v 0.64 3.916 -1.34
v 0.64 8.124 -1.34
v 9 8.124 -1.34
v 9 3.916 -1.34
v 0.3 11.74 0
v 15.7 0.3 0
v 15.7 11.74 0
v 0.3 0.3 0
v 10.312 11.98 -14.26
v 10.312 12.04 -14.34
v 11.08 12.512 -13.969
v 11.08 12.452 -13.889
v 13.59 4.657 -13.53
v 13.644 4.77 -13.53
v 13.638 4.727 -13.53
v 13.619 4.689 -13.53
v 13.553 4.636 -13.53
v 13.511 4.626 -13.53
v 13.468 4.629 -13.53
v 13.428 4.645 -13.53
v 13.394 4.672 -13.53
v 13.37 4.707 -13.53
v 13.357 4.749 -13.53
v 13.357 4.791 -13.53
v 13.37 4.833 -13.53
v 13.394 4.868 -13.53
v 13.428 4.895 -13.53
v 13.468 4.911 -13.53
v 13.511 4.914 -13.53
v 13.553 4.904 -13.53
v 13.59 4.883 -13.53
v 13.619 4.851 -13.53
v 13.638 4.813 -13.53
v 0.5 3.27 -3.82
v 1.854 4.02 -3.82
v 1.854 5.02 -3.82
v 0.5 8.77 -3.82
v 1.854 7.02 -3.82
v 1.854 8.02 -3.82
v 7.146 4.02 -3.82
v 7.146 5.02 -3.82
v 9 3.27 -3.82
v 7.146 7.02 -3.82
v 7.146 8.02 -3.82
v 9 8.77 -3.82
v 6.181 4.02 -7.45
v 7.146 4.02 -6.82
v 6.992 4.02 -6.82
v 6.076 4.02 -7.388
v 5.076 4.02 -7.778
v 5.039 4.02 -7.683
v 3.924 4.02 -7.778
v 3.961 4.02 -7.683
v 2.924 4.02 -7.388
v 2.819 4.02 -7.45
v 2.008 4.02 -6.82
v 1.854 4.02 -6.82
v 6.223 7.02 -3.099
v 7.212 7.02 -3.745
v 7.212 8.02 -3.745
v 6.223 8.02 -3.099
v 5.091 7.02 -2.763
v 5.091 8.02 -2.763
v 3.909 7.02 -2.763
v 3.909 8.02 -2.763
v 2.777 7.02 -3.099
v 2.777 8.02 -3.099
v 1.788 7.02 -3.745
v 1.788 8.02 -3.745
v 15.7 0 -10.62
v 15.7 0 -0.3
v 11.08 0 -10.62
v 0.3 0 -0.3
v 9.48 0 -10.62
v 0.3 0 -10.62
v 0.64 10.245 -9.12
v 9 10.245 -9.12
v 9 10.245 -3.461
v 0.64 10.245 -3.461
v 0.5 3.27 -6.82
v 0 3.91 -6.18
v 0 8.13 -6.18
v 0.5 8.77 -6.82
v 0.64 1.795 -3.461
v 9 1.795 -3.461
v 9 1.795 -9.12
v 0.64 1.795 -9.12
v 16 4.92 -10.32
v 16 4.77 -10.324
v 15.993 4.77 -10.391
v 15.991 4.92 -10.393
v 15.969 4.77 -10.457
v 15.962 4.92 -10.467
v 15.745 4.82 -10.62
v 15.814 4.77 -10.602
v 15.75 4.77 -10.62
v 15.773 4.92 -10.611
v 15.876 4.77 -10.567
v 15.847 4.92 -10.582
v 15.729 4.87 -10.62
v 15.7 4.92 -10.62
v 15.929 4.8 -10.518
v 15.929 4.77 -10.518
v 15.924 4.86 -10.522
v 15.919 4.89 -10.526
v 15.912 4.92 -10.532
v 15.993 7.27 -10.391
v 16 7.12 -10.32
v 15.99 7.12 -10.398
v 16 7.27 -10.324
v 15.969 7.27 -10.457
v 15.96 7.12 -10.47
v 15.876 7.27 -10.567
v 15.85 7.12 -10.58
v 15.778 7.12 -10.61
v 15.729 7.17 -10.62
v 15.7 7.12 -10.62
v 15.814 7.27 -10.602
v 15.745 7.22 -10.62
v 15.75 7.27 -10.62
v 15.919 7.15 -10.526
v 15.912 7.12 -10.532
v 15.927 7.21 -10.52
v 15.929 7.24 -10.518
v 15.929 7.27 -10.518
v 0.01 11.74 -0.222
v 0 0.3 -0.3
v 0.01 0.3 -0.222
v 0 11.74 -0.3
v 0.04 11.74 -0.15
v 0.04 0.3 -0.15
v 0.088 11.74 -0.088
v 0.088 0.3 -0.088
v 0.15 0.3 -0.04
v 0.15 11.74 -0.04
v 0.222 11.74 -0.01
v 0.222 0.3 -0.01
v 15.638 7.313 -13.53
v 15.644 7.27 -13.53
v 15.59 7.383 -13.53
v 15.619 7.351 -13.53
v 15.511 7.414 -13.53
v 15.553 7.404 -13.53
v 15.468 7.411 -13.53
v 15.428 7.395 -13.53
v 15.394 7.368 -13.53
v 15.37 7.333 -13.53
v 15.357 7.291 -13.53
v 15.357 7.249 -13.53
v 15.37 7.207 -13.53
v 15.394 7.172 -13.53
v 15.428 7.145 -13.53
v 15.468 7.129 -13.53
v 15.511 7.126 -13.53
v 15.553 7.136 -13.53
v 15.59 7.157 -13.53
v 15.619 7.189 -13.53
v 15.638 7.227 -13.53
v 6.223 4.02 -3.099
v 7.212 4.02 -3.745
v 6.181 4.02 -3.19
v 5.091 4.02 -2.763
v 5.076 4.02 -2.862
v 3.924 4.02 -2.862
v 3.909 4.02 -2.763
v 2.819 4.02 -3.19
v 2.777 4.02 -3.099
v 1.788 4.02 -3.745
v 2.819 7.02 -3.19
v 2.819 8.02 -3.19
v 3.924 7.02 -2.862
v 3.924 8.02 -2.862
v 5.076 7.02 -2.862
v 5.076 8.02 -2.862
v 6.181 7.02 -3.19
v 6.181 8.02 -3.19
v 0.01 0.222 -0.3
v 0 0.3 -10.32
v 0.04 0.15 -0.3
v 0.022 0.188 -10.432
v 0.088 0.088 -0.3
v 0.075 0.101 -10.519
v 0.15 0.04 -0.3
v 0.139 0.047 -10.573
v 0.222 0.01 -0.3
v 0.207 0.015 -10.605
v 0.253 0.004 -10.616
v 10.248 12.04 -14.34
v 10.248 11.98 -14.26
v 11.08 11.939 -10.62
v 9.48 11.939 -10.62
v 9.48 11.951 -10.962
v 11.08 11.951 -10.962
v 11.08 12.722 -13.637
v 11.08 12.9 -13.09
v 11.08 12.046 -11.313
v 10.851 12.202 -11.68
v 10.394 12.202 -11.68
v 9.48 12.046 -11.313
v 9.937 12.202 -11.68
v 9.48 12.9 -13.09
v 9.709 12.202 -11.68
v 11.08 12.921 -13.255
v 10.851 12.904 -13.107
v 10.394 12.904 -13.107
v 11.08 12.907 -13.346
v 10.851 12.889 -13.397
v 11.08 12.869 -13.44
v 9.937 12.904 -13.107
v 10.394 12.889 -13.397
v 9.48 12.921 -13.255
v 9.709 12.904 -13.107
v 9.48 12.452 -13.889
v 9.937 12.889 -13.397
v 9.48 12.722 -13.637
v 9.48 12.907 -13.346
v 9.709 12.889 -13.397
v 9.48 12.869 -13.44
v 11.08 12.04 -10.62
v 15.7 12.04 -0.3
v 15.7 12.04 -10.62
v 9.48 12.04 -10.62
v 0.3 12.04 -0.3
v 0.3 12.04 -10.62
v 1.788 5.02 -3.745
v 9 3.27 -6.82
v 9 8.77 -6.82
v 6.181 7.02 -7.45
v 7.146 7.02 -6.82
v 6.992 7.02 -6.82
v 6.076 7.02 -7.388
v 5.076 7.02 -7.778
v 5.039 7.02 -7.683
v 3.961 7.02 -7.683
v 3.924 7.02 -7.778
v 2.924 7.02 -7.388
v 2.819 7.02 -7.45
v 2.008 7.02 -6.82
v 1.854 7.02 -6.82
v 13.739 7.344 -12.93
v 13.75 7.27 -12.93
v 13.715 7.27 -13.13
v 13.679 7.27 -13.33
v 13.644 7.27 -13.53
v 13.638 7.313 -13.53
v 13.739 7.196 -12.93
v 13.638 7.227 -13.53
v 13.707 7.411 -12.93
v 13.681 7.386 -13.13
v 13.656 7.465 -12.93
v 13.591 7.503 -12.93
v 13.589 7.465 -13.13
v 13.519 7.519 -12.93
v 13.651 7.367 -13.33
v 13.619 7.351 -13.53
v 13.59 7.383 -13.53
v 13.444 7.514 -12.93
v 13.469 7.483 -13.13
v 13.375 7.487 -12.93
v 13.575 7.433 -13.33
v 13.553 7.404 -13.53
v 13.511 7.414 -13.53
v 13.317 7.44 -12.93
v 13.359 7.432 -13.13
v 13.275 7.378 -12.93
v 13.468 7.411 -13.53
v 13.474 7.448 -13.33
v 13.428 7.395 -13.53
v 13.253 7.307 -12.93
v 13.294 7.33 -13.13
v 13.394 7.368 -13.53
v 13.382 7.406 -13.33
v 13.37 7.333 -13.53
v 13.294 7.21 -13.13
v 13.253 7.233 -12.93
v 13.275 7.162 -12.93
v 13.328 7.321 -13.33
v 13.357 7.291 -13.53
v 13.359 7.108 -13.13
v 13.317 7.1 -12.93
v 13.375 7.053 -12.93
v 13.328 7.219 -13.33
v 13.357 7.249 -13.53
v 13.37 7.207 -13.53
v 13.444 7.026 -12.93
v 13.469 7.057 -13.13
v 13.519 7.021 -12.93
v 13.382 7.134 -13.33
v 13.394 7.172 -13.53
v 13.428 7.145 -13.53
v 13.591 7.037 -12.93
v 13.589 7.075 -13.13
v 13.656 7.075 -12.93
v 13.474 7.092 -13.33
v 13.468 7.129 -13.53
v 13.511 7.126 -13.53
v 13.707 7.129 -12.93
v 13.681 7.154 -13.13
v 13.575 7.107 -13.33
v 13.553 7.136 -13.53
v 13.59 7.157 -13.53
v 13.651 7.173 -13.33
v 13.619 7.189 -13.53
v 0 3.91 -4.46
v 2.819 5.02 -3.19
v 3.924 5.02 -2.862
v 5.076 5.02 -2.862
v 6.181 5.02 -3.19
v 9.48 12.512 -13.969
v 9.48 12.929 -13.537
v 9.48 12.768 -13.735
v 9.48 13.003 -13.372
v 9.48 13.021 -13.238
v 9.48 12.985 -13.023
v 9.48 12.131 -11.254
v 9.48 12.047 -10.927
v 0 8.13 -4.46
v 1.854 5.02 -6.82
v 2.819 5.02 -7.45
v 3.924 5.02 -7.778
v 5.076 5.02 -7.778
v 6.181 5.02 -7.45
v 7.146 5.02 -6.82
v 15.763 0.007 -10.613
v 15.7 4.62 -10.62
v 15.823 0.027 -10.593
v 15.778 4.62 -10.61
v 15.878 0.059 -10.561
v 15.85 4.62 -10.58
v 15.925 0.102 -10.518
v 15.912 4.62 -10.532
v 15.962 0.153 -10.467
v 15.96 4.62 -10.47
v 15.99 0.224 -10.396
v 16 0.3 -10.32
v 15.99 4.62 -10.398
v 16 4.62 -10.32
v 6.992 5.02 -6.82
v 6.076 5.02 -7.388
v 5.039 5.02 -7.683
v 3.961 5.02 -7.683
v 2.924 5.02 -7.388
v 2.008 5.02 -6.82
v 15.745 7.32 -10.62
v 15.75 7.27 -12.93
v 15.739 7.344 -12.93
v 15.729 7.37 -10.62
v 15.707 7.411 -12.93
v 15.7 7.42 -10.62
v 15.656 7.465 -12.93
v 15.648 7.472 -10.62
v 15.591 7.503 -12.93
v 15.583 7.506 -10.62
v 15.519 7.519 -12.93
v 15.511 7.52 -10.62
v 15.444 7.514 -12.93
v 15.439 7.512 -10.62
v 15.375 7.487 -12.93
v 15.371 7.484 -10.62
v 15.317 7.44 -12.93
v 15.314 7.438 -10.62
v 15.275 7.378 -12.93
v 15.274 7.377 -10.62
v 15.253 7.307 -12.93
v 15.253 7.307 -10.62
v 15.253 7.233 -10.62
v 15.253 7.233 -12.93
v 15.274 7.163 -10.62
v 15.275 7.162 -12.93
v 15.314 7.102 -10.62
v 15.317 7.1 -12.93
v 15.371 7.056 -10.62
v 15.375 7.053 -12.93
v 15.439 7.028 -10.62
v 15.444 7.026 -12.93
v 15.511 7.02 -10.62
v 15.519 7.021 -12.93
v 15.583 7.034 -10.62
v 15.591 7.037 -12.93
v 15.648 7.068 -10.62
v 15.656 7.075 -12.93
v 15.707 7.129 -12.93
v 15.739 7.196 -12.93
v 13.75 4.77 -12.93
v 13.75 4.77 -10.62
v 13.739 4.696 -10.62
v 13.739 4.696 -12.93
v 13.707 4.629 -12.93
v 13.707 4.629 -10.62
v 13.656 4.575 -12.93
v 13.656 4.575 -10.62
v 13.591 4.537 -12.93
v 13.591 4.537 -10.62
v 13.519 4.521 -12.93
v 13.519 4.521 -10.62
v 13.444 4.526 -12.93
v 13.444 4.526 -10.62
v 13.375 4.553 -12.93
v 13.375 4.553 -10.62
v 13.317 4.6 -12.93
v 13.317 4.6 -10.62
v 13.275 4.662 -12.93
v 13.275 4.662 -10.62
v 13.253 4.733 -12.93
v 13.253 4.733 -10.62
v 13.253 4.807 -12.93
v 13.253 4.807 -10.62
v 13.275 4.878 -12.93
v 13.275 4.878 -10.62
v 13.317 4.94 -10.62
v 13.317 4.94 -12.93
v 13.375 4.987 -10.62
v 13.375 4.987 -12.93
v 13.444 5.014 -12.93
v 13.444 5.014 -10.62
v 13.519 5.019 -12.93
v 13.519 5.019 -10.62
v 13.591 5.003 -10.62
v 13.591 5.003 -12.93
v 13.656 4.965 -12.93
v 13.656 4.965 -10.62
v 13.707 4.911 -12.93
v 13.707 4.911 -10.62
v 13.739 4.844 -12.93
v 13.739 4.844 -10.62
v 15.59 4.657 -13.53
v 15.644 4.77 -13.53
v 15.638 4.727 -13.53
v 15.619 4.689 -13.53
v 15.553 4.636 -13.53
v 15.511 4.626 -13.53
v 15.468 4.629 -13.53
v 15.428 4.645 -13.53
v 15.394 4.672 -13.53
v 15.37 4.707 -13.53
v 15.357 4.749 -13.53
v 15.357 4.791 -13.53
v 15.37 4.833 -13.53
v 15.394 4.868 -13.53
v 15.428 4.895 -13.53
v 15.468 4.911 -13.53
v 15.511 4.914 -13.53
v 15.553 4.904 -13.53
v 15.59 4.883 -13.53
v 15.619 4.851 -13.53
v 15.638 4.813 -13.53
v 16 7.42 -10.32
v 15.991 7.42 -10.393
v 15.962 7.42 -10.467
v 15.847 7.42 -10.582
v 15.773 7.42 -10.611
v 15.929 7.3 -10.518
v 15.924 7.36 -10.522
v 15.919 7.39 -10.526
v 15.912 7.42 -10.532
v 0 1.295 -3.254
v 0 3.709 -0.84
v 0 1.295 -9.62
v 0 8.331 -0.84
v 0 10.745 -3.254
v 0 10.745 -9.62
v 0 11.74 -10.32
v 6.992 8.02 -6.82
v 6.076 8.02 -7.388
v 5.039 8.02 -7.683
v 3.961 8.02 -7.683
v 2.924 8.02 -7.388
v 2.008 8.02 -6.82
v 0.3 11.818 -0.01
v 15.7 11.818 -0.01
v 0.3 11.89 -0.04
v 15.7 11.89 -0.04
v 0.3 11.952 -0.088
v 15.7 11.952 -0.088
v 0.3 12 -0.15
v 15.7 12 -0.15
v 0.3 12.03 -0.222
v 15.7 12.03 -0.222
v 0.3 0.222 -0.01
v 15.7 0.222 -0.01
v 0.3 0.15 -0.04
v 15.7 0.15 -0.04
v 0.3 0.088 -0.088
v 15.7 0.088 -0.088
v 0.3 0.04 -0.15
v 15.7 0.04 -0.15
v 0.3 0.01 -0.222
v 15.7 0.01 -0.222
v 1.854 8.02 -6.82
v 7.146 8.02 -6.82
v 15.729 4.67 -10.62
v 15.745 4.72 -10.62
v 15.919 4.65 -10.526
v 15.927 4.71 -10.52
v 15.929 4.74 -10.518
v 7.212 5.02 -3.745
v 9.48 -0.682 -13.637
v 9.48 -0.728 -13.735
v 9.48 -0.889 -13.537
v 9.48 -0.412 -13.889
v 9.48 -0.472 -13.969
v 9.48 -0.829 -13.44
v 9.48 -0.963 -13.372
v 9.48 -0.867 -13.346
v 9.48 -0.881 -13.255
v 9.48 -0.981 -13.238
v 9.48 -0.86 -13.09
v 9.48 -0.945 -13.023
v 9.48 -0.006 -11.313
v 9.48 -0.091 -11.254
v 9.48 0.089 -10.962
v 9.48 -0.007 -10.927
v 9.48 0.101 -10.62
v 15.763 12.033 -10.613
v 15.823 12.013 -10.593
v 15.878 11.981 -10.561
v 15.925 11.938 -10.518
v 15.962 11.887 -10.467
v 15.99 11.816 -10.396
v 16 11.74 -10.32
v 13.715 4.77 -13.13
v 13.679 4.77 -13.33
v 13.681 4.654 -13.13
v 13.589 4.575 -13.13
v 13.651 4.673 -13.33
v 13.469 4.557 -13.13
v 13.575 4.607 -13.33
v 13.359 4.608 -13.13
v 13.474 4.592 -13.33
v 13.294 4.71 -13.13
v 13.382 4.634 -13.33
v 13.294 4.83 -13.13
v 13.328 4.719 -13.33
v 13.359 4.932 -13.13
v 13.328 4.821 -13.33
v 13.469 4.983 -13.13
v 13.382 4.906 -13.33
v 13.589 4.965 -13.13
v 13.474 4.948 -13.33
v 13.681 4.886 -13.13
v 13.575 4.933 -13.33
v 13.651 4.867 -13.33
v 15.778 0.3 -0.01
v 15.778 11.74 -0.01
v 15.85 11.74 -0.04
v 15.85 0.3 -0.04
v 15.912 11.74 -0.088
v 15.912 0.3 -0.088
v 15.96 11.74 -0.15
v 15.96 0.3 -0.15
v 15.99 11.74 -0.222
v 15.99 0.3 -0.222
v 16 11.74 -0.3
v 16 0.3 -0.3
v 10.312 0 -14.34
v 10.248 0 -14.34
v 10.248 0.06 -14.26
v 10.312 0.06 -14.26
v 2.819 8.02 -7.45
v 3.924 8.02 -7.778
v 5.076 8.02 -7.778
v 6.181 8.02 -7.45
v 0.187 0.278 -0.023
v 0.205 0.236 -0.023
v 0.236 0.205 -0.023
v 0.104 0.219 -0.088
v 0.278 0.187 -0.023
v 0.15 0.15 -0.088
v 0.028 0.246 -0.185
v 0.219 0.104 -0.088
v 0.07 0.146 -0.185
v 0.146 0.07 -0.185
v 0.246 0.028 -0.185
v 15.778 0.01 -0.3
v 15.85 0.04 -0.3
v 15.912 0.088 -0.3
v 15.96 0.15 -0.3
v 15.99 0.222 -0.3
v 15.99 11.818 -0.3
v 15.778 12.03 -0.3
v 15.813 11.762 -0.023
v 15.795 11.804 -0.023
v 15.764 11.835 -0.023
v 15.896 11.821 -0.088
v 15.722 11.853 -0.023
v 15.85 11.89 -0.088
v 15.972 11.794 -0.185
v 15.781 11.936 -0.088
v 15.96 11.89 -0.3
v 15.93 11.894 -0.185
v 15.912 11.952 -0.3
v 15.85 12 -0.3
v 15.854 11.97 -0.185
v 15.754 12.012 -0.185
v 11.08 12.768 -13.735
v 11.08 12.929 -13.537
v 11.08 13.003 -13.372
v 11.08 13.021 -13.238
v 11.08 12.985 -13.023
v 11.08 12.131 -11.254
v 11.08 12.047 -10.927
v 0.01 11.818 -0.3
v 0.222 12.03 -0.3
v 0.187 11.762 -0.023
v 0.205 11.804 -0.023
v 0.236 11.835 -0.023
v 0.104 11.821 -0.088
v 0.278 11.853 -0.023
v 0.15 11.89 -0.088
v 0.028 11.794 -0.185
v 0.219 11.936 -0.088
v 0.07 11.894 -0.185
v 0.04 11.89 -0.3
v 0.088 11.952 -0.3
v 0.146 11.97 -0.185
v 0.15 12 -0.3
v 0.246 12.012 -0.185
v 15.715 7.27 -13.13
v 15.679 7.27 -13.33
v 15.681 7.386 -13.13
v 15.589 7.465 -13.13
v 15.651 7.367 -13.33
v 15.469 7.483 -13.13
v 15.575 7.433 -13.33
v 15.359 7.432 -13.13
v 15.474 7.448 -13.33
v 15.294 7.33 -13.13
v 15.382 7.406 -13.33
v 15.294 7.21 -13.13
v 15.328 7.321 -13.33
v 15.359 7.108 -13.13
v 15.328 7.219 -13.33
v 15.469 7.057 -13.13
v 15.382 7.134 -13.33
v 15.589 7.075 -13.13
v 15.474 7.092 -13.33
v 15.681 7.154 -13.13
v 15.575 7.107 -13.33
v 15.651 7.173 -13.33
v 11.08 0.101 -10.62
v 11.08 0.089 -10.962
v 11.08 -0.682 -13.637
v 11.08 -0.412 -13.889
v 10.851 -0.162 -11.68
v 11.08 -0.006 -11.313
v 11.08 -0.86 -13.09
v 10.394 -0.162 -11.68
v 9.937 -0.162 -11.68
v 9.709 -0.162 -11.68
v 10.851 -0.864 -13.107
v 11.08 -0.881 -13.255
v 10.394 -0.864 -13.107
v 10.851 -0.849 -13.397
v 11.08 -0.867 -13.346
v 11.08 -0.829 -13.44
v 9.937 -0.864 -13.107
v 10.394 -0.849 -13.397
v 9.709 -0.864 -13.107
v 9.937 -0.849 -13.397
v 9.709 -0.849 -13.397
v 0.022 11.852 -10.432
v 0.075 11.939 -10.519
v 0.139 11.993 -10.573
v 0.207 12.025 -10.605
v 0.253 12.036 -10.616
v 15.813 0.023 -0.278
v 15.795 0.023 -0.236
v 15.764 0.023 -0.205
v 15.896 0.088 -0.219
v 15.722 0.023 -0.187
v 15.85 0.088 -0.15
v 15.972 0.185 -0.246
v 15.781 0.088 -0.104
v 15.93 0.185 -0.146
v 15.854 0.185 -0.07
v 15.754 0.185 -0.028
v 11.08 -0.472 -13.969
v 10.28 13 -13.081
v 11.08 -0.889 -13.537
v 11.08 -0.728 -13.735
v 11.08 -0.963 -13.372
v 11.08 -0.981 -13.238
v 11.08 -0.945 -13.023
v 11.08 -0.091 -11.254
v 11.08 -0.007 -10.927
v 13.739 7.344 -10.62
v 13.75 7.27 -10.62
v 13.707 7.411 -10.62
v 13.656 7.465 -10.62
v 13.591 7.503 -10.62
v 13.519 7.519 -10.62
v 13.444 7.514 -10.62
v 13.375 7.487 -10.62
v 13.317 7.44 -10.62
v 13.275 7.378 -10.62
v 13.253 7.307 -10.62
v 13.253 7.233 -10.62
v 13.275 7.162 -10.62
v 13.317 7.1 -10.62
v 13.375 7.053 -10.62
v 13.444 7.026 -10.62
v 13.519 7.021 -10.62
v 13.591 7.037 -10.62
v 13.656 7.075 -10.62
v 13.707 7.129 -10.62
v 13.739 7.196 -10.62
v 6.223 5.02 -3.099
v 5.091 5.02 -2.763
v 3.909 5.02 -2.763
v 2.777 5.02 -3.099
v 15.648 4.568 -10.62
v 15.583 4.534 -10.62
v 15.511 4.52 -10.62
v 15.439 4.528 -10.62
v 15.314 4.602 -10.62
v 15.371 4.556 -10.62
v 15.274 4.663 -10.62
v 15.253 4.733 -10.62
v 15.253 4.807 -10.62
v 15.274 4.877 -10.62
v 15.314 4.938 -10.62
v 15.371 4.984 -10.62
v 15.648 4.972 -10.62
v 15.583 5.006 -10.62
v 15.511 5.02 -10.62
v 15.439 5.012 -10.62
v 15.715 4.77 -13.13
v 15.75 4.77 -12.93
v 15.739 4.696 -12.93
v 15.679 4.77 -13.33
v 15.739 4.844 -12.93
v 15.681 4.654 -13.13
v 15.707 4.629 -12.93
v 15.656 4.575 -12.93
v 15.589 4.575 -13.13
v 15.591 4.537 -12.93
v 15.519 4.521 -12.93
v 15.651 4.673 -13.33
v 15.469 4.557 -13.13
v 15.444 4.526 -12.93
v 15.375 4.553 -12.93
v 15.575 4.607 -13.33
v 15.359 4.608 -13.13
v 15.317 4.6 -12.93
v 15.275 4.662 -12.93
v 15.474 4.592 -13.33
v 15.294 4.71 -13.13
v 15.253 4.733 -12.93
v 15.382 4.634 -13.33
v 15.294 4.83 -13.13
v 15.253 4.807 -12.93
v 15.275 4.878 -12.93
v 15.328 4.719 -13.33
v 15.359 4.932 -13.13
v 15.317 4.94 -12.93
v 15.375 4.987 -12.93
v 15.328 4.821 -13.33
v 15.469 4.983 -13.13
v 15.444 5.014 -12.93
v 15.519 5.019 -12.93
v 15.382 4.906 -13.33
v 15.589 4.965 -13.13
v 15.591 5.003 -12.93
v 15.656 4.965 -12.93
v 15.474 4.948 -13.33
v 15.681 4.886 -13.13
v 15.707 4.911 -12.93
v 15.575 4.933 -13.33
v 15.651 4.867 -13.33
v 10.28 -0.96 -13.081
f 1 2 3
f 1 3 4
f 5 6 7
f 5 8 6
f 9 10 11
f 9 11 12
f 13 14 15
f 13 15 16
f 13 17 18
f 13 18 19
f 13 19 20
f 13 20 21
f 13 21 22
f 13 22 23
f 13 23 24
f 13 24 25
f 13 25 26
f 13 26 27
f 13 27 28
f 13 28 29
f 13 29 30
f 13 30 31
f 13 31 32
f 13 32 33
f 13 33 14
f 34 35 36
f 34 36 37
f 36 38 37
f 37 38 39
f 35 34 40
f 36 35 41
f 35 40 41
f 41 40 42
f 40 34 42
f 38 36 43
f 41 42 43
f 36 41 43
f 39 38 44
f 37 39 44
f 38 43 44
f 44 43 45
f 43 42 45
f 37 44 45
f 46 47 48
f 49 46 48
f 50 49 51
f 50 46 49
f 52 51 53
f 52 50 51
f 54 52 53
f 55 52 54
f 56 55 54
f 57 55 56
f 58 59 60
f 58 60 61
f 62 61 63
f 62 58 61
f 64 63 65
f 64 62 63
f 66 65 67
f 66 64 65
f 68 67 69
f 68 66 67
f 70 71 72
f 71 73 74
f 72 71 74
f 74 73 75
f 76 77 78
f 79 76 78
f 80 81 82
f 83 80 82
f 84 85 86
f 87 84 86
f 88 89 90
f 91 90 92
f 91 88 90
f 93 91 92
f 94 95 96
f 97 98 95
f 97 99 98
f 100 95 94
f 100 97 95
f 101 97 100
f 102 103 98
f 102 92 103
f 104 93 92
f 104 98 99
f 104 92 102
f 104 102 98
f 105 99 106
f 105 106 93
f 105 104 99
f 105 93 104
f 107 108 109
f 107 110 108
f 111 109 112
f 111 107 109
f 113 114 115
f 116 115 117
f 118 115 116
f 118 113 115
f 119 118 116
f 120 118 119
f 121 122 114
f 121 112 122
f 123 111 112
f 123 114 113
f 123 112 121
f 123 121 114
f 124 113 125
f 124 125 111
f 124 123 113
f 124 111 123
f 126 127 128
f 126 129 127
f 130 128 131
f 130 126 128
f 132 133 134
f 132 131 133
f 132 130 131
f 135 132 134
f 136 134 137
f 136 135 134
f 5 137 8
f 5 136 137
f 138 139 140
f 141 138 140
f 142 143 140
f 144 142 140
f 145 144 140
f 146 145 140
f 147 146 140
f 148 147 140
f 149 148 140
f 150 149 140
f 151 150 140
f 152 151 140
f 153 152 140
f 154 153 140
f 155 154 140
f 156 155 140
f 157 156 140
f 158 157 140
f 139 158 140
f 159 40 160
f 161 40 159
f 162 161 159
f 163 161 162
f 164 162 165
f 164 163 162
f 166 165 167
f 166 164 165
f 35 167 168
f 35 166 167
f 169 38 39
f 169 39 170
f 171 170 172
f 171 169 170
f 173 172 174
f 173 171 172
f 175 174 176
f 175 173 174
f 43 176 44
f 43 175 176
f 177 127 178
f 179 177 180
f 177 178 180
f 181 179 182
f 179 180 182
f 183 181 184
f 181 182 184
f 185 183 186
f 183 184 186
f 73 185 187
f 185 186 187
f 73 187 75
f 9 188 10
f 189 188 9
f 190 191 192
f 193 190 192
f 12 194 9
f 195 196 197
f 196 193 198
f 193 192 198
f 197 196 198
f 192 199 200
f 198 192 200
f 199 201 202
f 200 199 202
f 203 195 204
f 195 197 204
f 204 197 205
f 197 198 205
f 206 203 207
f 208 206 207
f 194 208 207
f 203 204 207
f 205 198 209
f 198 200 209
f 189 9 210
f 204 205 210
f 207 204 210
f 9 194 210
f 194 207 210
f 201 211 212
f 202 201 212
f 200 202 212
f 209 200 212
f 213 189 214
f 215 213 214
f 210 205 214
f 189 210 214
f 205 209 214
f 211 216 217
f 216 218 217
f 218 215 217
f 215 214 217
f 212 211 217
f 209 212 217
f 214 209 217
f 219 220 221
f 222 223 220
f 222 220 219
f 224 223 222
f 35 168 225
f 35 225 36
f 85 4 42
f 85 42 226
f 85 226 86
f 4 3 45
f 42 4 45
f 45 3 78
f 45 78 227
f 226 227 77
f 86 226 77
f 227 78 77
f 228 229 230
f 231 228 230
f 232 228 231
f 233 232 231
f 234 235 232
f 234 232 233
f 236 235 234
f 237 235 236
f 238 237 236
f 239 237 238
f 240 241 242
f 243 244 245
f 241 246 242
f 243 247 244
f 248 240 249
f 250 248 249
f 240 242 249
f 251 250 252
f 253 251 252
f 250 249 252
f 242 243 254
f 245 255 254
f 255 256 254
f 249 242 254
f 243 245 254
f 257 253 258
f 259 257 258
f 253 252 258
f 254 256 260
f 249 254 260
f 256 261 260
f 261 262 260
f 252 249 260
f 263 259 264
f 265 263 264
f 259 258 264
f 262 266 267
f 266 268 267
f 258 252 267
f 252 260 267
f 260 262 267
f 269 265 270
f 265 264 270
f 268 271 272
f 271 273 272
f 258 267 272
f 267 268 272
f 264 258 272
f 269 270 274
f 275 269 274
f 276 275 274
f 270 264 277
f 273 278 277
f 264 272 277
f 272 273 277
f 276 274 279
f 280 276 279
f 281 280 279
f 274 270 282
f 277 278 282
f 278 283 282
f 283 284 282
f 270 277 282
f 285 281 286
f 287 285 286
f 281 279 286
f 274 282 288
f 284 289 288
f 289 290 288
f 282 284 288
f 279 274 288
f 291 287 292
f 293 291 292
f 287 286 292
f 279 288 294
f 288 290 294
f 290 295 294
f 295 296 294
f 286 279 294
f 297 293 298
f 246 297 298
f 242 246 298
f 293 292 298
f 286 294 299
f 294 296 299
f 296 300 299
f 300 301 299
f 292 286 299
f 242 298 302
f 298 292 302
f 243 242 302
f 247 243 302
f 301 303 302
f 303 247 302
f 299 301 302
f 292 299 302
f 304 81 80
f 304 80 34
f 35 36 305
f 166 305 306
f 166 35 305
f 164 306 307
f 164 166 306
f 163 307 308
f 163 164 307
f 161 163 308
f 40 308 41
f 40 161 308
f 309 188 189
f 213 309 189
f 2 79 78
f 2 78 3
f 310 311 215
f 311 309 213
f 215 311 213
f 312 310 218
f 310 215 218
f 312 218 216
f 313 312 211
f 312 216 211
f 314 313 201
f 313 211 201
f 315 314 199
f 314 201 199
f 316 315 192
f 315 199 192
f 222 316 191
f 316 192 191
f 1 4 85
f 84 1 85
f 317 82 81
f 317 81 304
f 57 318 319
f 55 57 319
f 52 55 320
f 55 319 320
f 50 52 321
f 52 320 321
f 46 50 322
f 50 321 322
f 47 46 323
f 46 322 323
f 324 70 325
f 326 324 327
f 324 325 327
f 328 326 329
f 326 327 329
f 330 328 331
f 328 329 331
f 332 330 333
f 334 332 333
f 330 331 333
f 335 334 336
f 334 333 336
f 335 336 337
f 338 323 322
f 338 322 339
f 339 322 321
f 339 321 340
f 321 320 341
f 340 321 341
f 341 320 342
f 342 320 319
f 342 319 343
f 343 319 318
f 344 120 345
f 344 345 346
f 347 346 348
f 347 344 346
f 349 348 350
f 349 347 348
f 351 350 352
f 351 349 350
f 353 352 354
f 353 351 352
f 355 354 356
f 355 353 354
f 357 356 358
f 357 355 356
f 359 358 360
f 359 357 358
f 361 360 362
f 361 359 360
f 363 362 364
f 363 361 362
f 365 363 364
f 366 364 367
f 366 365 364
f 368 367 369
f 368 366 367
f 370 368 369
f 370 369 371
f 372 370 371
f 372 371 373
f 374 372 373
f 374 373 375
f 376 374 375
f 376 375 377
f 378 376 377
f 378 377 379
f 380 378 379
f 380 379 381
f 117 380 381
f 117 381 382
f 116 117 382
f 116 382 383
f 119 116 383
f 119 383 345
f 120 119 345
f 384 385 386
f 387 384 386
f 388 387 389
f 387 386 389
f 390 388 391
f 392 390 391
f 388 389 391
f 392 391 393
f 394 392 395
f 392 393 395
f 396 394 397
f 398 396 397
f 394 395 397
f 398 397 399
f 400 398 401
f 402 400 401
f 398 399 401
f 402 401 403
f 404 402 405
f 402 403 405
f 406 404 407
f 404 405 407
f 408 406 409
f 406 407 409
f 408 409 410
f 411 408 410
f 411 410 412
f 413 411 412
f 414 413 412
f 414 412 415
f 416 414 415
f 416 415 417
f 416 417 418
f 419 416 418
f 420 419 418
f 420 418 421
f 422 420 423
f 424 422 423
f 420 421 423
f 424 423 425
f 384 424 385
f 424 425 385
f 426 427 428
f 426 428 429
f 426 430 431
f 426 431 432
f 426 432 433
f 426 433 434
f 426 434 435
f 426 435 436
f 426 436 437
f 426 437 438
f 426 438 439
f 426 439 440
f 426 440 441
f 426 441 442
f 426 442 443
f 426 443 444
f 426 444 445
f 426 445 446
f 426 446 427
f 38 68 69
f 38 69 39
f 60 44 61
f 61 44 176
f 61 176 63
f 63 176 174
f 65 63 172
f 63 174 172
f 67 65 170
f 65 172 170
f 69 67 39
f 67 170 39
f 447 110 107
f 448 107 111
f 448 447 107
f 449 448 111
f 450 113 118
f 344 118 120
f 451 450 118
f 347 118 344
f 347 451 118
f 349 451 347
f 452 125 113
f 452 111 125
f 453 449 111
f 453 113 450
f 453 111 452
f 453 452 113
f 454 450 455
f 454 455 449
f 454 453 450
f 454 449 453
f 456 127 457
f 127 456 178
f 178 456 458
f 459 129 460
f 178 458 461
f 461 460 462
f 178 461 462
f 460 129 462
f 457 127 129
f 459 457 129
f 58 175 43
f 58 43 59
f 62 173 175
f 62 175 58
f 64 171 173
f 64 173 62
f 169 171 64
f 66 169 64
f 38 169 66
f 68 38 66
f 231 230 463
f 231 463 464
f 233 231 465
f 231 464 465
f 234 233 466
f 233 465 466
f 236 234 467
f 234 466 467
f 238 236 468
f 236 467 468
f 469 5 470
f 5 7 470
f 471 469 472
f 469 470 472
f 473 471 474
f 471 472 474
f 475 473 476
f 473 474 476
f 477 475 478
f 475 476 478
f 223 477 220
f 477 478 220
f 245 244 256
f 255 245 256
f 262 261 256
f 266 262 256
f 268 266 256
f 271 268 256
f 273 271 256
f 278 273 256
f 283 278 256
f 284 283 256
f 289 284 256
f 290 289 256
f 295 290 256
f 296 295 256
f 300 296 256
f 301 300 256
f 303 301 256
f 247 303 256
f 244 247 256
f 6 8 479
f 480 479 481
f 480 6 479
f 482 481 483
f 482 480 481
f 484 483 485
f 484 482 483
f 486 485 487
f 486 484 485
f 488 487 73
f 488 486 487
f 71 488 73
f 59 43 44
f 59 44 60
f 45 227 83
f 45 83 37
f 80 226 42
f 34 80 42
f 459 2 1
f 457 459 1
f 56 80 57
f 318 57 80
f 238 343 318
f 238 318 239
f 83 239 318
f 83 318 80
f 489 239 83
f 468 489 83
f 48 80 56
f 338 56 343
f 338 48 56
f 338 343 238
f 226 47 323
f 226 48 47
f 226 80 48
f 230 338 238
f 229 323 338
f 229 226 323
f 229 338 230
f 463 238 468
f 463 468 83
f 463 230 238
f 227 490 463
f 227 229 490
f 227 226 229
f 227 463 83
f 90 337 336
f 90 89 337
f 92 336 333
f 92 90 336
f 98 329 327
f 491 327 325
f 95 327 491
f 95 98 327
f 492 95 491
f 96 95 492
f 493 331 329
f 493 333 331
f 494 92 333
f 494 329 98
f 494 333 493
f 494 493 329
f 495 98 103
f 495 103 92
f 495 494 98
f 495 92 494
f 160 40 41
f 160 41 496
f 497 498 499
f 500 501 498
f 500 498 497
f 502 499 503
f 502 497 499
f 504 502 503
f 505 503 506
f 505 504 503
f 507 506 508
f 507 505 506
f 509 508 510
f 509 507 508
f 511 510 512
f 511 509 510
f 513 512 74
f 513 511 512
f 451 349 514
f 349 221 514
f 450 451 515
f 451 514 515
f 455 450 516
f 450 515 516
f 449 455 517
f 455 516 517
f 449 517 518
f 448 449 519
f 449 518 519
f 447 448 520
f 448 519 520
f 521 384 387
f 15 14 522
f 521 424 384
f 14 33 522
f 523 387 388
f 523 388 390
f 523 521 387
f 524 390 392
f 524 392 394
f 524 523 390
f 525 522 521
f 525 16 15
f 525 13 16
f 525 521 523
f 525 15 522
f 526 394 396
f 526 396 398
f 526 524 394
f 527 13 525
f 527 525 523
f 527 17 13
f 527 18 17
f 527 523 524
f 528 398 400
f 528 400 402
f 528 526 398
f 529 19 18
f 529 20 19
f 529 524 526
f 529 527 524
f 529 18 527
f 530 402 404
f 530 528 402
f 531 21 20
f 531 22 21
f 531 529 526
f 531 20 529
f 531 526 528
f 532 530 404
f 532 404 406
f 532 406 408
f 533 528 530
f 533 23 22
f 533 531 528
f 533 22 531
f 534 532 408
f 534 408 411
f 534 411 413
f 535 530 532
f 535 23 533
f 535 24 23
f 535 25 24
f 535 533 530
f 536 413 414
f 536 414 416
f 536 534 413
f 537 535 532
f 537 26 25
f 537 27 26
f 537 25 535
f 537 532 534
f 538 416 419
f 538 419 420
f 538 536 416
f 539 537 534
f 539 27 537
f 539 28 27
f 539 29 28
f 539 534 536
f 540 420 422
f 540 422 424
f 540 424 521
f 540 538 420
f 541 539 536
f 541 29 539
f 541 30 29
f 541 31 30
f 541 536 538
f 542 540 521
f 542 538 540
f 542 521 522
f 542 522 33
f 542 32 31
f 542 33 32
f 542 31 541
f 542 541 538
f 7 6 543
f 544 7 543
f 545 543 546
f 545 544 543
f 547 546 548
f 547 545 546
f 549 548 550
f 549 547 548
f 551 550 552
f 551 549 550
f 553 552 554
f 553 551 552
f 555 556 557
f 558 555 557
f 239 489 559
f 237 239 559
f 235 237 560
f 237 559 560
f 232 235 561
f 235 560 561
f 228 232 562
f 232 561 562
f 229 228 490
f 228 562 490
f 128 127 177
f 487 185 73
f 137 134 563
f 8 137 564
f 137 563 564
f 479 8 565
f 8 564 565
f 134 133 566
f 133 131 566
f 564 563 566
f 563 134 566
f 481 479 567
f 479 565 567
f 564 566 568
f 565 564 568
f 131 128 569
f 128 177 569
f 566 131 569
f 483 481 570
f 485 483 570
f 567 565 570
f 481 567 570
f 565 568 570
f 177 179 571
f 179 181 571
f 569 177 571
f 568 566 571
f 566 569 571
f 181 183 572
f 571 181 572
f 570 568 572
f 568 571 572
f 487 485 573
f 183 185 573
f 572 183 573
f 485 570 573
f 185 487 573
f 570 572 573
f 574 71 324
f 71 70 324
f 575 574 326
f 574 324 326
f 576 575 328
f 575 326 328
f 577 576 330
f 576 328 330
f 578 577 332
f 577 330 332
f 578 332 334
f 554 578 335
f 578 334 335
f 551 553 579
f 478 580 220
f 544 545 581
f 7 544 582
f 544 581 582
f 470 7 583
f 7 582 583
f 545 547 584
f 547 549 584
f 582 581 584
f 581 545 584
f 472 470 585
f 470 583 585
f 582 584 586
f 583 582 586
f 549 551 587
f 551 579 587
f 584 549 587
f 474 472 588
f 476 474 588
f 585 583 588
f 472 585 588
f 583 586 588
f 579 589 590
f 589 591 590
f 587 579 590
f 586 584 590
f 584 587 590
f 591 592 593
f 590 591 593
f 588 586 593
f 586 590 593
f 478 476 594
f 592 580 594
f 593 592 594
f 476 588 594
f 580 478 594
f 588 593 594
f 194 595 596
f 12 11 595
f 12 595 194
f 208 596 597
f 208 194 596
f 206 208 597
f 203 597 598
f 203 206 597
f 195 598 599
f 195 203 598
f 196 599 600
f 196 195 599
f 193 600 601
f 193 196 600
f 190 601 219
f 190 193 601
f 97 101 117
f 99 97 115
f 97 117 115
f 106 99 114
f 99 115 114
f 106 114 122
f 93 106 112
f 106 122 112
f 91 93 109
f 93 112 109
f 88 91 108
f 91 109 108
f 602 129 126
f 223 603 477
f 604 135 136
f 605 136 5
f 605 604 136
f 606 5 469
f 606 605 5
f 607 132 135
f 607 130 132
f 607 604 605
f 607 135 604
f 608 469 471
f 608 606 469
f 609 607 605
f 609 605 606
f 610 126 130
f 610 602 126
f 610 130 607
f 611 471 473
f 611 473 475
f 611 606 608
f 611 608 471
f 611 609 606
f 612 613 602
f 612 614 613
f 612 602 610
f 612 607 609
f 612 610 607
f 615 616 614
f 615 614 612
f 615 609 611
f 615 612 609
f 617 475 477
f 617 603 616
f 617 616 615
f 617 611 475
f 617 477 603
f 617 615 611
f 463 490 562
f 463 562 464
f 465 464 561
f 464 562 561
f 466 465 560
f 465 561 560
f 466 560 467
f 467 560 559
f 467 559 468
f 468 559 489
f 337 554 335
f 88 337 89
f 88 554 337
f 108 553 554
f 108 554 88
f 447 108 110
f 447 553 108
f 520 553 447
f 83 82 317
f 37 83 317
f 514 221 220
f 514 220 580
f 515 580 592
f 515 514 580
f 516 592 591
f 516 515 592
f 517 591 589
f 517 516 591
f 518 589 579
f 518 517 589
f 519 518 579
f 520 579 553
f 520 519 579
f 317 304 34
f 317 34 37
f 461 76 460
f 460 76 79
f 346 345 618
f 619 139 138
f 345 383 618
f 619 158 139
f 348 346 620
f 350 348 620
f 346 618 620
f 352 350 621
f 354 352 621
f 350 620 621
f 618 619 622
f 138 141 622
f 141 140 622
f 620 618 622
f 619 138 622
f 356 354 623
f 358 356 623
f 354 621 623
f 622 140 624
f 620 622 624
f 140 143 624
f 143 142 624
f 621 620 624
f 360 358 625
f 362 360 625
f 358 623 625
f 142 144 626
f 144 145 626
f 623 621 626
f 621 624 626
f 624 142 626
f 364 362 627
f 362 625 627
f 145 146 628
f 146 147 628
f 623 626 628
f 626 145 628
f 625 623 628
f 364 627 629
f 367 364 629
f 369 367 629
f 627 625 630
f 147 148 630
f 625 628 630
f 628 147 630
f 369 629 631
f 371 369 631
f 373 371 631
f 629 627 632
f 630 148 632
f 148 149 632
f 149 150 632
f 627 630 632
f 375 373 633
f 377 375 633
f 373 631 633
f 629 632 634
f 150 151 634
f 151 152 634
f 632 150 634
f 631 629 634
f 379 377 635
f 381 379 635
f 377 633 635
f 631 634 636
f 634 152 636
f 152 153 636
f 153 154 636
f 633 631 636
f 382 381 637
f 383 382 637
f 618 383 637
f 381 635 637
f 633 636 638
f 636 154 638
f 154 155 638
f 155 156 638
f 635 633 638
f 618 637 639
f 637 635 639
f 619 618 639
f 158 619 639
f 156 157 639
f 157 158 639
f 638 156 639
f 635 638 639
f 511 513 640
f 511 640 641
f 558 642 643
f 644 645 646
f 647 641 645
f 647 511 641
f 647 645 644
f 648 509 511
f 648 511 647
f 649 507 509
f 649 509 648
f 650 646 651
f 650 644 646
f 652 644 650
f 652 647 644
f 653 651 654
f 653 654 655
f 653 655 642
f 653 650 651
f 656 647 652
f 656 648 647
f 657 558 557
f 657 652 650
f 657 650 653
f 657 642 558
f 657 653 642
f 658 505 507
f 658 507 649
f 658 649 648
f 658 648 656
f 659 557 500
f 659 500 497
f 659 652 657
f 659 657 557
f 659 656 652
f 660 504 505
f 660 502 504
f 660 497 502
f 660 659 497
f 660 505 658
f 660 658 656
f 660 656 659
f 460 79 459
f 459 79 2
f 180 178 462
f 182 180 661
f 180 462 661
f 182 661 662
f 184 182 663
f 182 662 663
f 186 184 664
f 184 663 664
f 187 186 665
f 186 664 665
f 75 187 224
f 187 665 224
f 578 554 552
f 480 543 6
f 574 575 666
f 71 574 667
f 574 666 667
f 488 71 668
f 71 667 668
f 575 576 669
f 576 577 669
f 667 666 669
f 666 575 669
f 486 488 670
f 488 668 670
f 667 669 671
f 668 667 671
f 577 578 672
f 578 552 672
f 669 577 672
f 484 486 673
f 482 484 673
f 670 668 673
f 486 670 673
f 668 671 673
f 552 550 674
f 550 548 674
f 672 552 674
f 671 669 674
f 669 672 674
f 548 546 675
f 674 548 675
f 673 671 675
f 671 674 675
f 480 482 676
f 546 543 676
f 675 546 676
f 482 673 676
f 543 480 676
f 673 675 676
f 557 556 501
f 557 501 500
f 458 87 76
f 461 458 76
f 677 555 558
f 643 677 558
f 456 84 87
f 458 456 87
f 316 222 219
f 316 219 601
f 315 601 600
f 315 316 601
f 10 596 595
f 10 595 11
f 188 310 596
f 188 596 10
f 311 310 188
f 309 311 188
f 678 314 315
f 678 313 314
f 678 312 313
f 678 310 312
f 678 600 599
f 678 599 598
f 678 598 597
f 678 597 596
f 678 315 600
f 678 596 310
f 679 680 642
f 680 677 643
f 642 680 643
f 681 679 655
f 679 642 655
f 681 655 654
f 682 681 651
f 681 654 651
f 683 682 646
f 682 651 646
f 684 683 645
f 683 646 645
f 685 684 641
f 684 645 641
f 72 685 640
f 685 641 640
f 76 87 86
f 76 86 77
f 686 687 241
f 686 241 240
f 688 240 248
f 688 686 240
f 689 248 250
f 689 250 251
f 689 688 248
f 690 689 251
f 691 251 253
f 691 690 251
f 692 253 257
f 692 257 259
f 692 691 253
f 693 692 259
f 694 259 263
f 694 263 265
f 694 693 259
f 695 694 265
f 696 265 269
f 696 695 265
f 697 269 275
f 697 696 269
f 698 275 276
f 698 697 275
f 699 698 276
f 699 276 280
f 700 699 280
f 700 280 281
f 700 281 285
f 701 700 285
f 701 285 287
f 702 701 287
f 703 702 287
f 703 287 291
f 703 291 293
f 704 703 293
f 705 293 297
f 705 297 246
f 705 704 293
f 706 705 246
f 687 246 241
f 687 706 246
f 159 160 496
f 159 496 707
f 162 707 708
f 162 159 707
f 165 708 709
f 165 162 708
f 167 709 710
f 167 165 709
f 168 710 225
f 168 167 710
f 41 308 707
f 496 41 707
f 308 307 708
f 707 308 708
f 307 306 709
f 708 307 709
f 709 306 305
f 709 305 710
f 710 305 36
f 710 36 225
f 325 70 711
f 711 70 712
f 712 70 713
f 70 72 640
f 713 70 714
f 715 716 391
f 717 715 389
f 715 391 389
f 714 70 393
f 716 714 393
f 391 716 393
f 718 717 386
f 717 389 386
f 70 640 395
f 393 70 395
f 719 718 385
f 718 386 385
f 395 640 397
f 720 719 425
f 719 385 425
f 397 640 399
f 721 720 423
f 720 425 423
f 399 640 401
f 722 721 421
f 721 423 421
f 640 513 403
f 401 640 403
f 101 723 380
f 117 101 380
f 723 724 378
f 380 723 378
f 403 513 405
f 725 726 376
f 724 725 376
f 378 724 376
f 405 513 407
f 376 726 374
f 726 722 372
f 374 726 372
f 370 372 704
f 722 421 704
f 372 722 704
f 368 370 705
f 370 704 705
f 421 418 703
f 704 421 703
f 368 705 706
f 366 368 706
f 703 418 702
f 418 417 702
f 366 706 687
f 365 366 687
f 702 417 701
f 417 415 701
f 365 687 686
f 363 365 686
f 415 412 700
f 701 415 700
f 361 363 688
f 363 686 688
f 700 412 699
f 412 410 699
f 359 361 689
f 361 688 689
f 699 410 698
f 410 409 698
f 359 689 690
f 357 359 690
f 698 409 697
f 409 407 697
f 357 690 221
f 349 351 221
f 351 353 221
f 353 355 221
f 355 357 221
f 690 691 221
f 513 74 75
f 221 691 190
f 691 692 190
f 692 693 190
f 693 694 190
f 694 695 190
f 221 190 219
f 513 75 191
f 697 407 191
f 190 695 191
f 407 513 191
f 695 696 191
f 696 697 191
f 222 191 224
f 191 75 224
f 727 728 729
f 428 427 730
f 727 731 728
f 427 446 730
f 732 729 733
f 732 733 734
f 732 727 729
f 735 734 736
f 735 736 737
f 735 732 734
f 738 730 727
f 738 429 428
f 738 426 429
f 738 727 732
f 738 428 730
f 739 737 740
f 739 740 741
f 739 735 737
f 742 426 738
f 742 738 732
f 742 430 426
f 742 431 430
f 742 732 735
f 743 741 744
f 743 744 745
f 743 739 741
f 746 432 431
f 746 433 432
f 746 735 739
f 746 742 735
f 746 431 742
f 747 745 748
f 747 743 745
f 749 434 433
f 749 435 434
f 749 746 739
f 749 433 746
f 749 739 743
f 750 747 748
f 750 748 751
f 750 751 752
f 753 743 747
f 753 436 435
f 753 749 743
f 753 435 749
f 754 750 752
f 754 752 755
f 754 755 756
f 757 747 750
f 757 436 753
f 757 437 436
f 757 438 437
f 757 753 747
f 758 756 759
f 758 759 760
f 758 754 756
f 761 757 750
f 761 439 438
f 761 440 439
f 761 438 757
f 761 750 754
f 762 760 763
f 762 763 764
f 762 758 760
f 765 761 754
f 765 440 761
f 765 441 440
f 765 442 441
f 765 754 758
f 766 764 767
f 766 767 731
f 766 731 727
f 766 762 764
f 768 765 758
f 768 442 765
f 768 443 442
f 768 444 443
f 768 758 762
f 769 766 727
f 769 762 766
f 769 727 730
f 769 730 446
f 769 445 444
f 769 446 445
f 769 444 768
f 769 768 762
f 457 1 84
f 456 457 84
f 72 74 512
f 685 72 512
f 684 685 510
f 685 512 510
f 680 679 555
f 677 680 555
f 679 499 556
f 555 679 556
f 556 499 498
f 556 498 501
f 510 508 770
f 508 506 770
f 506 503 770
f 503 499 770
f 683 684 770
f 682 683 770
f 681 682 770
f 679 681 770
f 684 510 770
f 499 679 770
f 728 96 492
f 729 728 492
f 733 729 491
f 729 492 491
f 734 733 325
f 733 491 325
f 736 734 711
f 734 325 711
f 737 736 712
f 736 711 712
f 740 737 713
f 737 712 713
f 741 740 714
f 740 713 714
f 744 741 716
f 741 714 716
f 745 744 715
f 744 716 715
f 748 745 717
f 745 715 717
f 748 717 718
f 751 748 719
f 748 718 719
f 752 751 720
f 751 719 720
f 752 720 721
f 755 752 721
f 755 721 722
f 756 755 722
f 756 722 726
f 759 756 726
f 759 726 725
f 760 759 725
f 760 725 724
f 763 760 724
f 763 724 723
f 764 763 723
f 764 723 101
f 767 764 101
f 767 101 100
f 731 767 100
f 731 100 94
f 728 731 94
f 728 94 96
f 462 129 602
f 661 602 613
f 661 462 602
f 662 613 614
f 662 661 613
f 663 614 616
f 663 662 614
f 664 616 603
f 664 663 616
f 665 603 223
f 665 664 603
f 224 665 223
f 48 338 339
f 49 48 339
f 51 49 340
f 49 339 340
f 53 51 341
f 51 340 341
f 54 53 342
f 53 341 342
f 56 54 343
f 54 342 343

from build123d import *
from OCP.BRepFilletAPI import BRepFilletAPI_MakeChamfer

# Parameters (mm, degrees)
SKETCH1_W                 = 10.62
SKETCH1_H                 = 12.04
BOSS_EXTRUDE1_DEPTH       = 16
CUT_EXTRUDE1_DEPTH        = 9
SKETCH3_W                 = 3
SKETCH3_H                 = 5.5
BOSS_EXTRUDE2_DEPTH       = 9
EXTRUDE_THIN1_DEPTH       = 2
SKETCH5_W                 = 1
SKETCH5_H                 = 2
SKETCH5_W_2               = 1.1
CUT_EXTRUDE2_DEPTH        = 9
SKETCH6_R                 = 0.25
BOSS_EXTRUDE4_DEPTH       = 2.91
CHAMFER1_SIZE             = 0.6
CHAMFER1_SIZE2            = 0.105796188
EXTRUDE_THIN2_START       = -0.8
EXTRUDE_THIN2_DEPTH       = 1.6
CHAMFER2_SIZE             = 0.6
CHAMFER2_SIZE2            = 0.767964979
CHAMFER2_OF_MIRROR2_SIZE  = 0.6
CHAMFER2_OF_MIRROR2_SIZE2 = 0.767964979
CHAMFER3_SIZE             = 0.5
CHAMFER3_SIZE2            = 0.639970816
FILLET1_R                 = 0.3


# Read off the part's stored shape, not the designer's step: Extrude-Thin2
with BuildPart() as part:
    # Sketch1 → Boss-Extrude1 (new body)
    with BuildSketch(Plane(origin=(0, 0, 0), x_dir=(0, 0, -1), z_dir=(1, 0, 0))):
        with Locations((5.31, 6.02)):
            Rectangle(SKETCH1_W, SKETCH1_H)
    extrude(amount=BOSS_EXTRUDE1_DEPTH)

    # Sketch2 → Cut-Extrude1 (cut)
    with BuildSketch(Plane.ZY):
        Polygon((-3.461320344, 10.245), (-1.34, 8.123679656), (-1.34, 3.916320344), (-3.461320344, 1.795), (-9.12, 1.795), (-9.12, 10.245), align=None)
    extrude(amount=-CUT_EXTRUDE1_DEPTH, mode=Mode.SUBTRACT)

    # Sketch3 → Boss-Extrude2 (add)
    with BuildSketch(Plane.ZY.offset(-9)):
        with Locations((-5.32, 6.02)):
            Rectangle(SKETCH3_W, SKETCH3_H)
    extrude(amount=BOSS_EXTRUDE2_DEPTH)

    # Sketch4 → Extrude-Thin1 (add, symmetric)
    with BuildSketch(Plane(origin=(0, 6.02, 0), x_dir=(1, 0, 0), z_dir=(0, 1, 0))):
        with BuildLine():
            ThreePointArc((1.854248689, 3.82), (4.5, 2.82), (7.145751311, 3.82))
            Line((7.145751311, 3.82), (7.211895094, 3.745))
            ThreePointArc((7.211895094, 3.745), (4.5, 2.72), (1.788104906, 3.745))
            Line((1.788104906, 3.745), (1.854248689, 3.82))
        make_face()
        with BuildLine():
            ThreePointArc((1.854248689, 6.82), (4.5, 7.82), (7.145751311, 6.82))
            Line((7.145751311, 6.82), (7.079607528, 6.745))
            ThreePointArc((7.079607528, 6.745), (4.5, 7.72), (1.920392472, 6.745))
            Line((1.920392472, 6.745), (1.854248689, 6.82))
        make_face()
    extrude(amount=EXTRUDE_THIN1_DEPTH, both=True)


with BuildPart() as extrude_thin1_piece_1:
    # of the separate pieces the step leaves, piece 1, a body of its own (extrude_thin1_pieces)
    add(part.part.solids().sort_by_distance((0, 0, 0))[0])


with BuildPart() as extrude_thin1_piece_2:
    # of the separate pieces the step leaves, piece 2, a body of its own (extrude_thin1_pieces)
    add(part.part.solids().sort_by_distance((1.788104906, 4.02, -3.745))[0])


with BuildPart() as cut_extrude2_tool:
    # Sketch5 → Cut-Extrude2 (new body)
    with BuildSketch(Plane.ZY):
        with Locations((-7.32, 6.02)):
            Rectangle(SKETCH5_W, SKETCH5_H)
        with Locations((-3.27, 6.02)):
            Rectangle(SKETCH5_W_2, SKETCH5_H)
    extrude(amount=-CUT_EXTRUDE2_DEPTH)


with BuildPart() as extrude_thin1_piece_1_1:
    add(extrude_thin1_piece_1.part)

    # Cut-Extrude2: cut by cut_extrude2_tool
    add(cut_extrude2_tool.part, mode=Mode.SUBTRACT)

    # Sketch6 → Boss-Extrude4 (add)
    with BuildSketch(Plane(origin=(0, 0, -10.62), x_dir=(-1, 0, 0), z_dir=(0, 0, -1))):
        with Locations(Location((-15.5, 4.77, 0), (0, 0, 180))):
            Circle(SKETCH6_R)
        with Locations(Location((-13.5, 4.77, 0), (0, 0, 180))):
            Circle(SKETCH6_R)
    boss_extrude4 = extrude(amount=BOSS_EXTRUDE4_DEPTH)

    # Mirror1: Boss-Extrude4 across plane
    add(boss_extrude4.mirror(Plane.ZX.offset(6.02)))

    # Chamfer1: one chamfer whose edges measure the first distance from different faces: ONE call of the kernel's chamfer builder (chamfer() names one face for all edges)
    chamfer1_edges_1 = [extrude_thin1_piece_1_1.edges().sort_by_distance(p)[0] for p in [
        (15.25, 4.77, -13.53),
    ]]
    chamfer1_side_1 = [extrude_thin1_piece_1_1.faces().sort_by_distance(p)[0] for p in [
        (15.25, 4.77, -12.075),
    ]]
    chamfer1_edges_2 = [extrude_thin1_piece_1_1.edges().sort_by_distance(p)[0] for p in [
        (13.25, 4.77, -13.53),
    ]]
    chamfer1_side_2 = [extrude_thin1_piece_1_1.faces().sort_by_distance(p)[0] for p in [
        (13.25, 4.77, -12.075),
    ]]
    chamfer1_edges_3 = [extrude_thin1_piece_1_1.edges().sort_by_distance(p)[0] for p in [
        (15.25, 7.27, -13.53),
    ]]
    chamfer1_side_3 = [extrude_thin1_piece_1_1.faces().sort_by_distance(p)[0] for p in [
        (15.25, 7.27, -12.075),
    ]]
    chamfer1_edges_4 = [extrude_thin1_piece_1_1.edges().sort_by_distance(p)[0] for p in [
        (13.25, 7.27, -13.53),
    ]]
    chamfer1_side_4 = [extrude_thin1_piece_1_1.faces().sort_by_distance(p)[0] for p in [
        (13.25, 7.27, -12.075),
    ]]
    chamfer1 = BRepFilletAPI_MakeChamfer(extrude_thin1_piece_1_1.part.solid().wrapped)
    for e in chamfer1_edges_1:
        chamfer1.Add(CHAMFER1_SIZE, CHAMFER1_SIZE2, e.wrapped, chamfer1_side_1[0].wrapped)  # the first distance lies on this face
    for e in chamfer1_edges_2:
        chamfer1.Add(CHAMFER1_SIZE, CHAMFER1_SIZE2, e.wrapped, chamfer1_side_2[0].wrapped)  # the first distance lies on this face
    for e in chamfer1_edges_3:
        chamfer1.Add(CHAMFER1_SIZE, CHAMFER1_SIZE2, e.wrapped, chamfer1_side_3[0].wrapped)  # the first distance lies on this face
    for e in chamfer1_edges_4:
        chamfer1.Add(CHAMFER1_SIZE, CHAMFER1_SIZE2, e.wrapped, chamfer1_side_4[0].wrapped)  # the first distance lies on this face
    add(Compound.cast(chamfer1.Shape()), mode=Mode.REPLACE)

    # Extrude-Thin2 outline → Extrude-Thin2 (add)
    with BuildSketch(Plane(origin=(10.28, 0, 0), x_dir=(0, 0, -1), z_dir=(1, 0, 0)).offset(EXTRUDE_THIN2_START)):
        with BuildLine():
            add(Edge.make_bspline(
                [(10.62, 0.100785264), (10.78746189, 0.120691448), (10.961308674, 0.097575512), (11.31686022, 0.000462287), (11.499294447, -0.075182032), (12.042092662, -0.336079557), (12.399243383, -0.555911401), (12.854919353, -0.78062608), (12.993528767, -0.837606718), (13.220692587, -0.889968812), (13.303177575, -0.888038744), (13.490975312, -0.810678223), (13.599756729, -0.728624571), (13.87736205, -0.434805978), (14.045169288, -0.224974114), (14.260148158, 0.060197038)],
                knots=[0.00319215, 0.00319215, 0.00319215, 0.00319215, 0.125, 0.125, 0.25, 0.25, 0.5, 0.5, 0.625, 0.625, 0.75, 0.75, 0.875, 0.875, 1, 1, 1, 1], degree=3))
            Line((10.62, 0.100785264), (10.62, 0))
            add(Edge.make_bspline(
                [(10.62, 0), (11.386548613, 0.101703811), (13.086621384, -1.362502031), (13.690445345, -0.861639328), (14.34, 0)],
                knots=[0, 0, 0, 0, 0.62378462, 1, 1, 1, 1], degree=3))
            Line((14.34, 0), (14.260148158, 0.060197038))
        make_face()
    extrude_thin2 = extrude(amount=EXTRUDE_THIN2_DEPTH)

    # Chamfer2: one chamfer whose edges measure the first distance from different faces: ONE call of the kernel's chamfer builder (chamfer() names one face for all edges)
    chamfer2_edges_1 = [extrude_thin1_piece_1_1.edges().sort_by_distance(p)[0] for p in [
        (9.48, 0.030098519, -14.300074079),
    ]]
    chamfer2_side_1 = [extrude_thin1_piece_1_1.faces().sort_by_distance(p)[0] for p in [
        (9.48, -0.678712297, -12.564688228),
    ]]
    chamfer2_edges_2 = [extrude_thin1_piece_1_1.edges().sort_by_distance(p)[0] for p in [
        (11.08, 0.030098519, -14.300074079),
    ]]
    chamfer2_side_2 = [extrude_thin1_piece_1_1.faces().sort_by_distance(p)[0] for p in [
        (11.08, -0.678712297, -12.564688228),
    ]]
    chamfer2 = BRepFilletAPI_MakeChamfer(extrude_thin1_piece_1_1.part.solid().wrapped)
    for e in chamfer2_edges_1:
        chamfer2.Add(CHAMFER2_SIZE, CHAMFER2_SIZE2, e.wrapped, chamfer2_side_1[0].wrapped)  # the first distance lies on this face
    for e in chamfer2_edges_2:
        chamfer2.Add(CHAMFER2_SIZE, CHAMFER2_SIZE2, e.wrapped, chamfer2_side_2[0].wrapped)  # the first distance lies on this face
    add(Compound.cast(chamfer2.Shape()), mode=Mode.REPLACE)

    # Mirror2: Extrude-Thin2 across plane
    add(extrude_thin2.mirror(Plane.ZX.offset(6.02)))

    # Chamfer2 of Mirror2: one chamfer whose edges measure the first distance from different faces: ONE call of the kernel's chamfer builder (chamfer() names one face for all edges)
    chamfer2_of_mirror2_edges_1 = [extrude_thin1_piece_1_1.edges().sort_by_distance(p)[0] for p in [
        (9.48, 12.009901481, -14.300074079),
    ]]
    chamfer2_of_mirror2_side_1 = [extrude_thin1_piece_1_1.faces().sort_by_distance(p)[0] for p in [
        (9.48, 12.718712297, -12.564688228),
    ]]
    chamfer2_of_mirror2_edges_2 = [extrude_thin1_piece_1_1.edges().sort_by_distance(p)[0] for p in [
        (11.08, 12.009901481, -14.300074079),
    ]]
    chamfer2_of_mirror2_side_2 = [extrude_thin1_piece_1_1.faces().sort_by_distance(p)[0] for p in [
        (11.08, 12.718712297, -12.564688228),
    ]]
    chamfer2_of_mirror2 = BRepFilletAPI_MakeChamfer(extrude_thin1_piece_1_1.part.solid().wrapped)
    for e in chamfer2_of_mirror2_edges_1:
        chamfer2_of_mirror2.Add(CHAMFER2_OF_MIRROR2_SIZE, CHAMFER2_OF_MIRROR2_SIZE2, e.wrapped, chamfer2_of_mirror2_side_1[0].wrapped)  # the first distance lies on this face
    for e in chamfer2_of_mirror2_edges_2:
        chamfer2_of_mirror2.Add(CHAMFER2_OF_MIRROR2_SIZE, CHAMFER2_OF_MIRROR2_SIZE2, e.wrapped, chamfer2_of_mirror2_side_2[0].wrapped)  # the first distance lies on this face
    add(Compound.cast(chamfer2_of_mirror2.Shape()), mode=Mode.REPLACE)

    # Chamfer3: one chamfer whose edges measure the first distance from different faces: ONE call of the kernel's chamfer builder (chamfer() names one face for all edges)
    chamfer3_edges_1 = [extrude_thin1_piece_1_1.edges().sort_by_distance(p)[0] for p in [
        (0, 2.855660172, -2.400660172),
        (0, 6.02, -1.34),
        (0, 9.184339828, -2.400660172),
        (0, 10.245, -6.290660172),
        (0, 6.02, -9.12),
        (0, 1.795, -6.290660172),
    ]]
    chamfer3_side_1 = [extrude_thin1_piece_1_1.faces().sort_by_distance(p)[0] for p in [
        (0, 0.160544698, -5.31),
    ]]
    chamfer3_edges_2 = [extrude_thin1_piece_1_1.edges().sort_by_distance(p)[0] for p in [
        (0, 6.02, -6.82),
    ]]
    chamfer3_side_2 = [extrude_thin1_piece_1_1.faces().sort_by_distance(p)[0] for p in [
        (4.5, 6.02, -6.82),
    ]]
    chamfer3_edges_3 = [extrude_thin1_piece_1_1.edges().sort_by_distance(p)[0] for p in [
        (0, 3.27, -5.32),
    ]]
    chamfer3_side_3 = [extrude_thin1_piece_1_1.faces().sort_by_distance(p)[0] for p in [
        (4.5, 3.27, -5.32),
    ]]
    chamfer3_edges_4 = [extrude_thin1_piece_1_1.edges().sort_by_distance(p)[0] for p in [
        (0, 6.02, -3.82),
    ]]
    chamfer3_side_4 = [extrude_thin1_piece_1_1.faces().sort_by_distance(p)[0] for p in [
        (4.5, 6.02, -3.82),
    ]]
    chamfer3_edges_5 = [extrude_thin1_piece_1_1.edges().sort_by_distance(p)[0] for p in [
        (0, 8.77, -5.32),
    ]]
    chamfer3_side_5 = [extrude_thin1_piece_1_1.faces().sort_by_distance(p)[0] for p in [
        (4.5, 8.77, -5.32),
    ]]
    chamfer3 = BRepFilletAPI_MakeChamfer(extrude_thin1_piece_1_1.part.solid().wrapped)
    for e in chamfer3_edges_1:
        chamfer3.Add(CHAMFER3_SIZE, CHAMFER3_SIZE2, e.wrapped, chamfer3_side_1[0].wrapped)  # the first distance lies on this face
    for e in chamfer3_edges_2:
        chamfer3.Add(CHAMFER3_SIZE, CHAMFER3_SIZE2, e.wrapped, chamfer3_side_2[0].wrapped)  # the first distance lies on this face
    for e in chamfer3_edges_3:
        chamfer3.Add(CHAMFER3_SIZE, CHAMFER3_SIZE2, e.wrapped, chamfer3_side_3[0].wrapped)  # the first distance lies on this face
    for e in chamfer3_edges_4:
        chamfer3.Add(CHAMFER3_SIZE, CHAMFER3_SIZE2, e.wrapped, chamfer3_side_4[0].wrapped)  # the first distance lies on this face
    for e in chamfer3_edges_5:
        chamfer3.Add(CHAMFER3_SIZE, CHAMFER3_SIZE2, e.wrapped, chamfer3_side_5[0].wrapped)  # the first distance lies on this face
    add(Compound.cast(chamfer3.Shape()), mode=Mode.REPLACE)

    # Fillet1
    fillet1_edges = [extrude_thin1_piece_1_1.edges().sort_by_distance(p)[0] for p in [
        (16, 6.02, -10.62),
        (16, 12.04, -5.31),
        (16, 6.02, 0),
        (0, 12.04, -5.31),
        (0, 6.02, -10.62),
        (0, 0, -5.31),
        (0, 6.02, 0),
        (16, 0, -5.31),
        (8, 12.04, 0),
        (8, 0, 0),
    ]]
    fillet(fillet1_edges, radius=FILLET1_R)


with BuildPart() as extrude_thin1_piece_2_1:
    add(extrude_thin1_piece_2.part)

    # Cut-Extrude2: cut by cut_extrude2_tool
    add(cut_extrude2_tool.part, mode=Mode.SUBTRACT)


solid = Compound([extrude_thin1_piece_1_1.part, extrude_thin1_piece_2_1.part])
